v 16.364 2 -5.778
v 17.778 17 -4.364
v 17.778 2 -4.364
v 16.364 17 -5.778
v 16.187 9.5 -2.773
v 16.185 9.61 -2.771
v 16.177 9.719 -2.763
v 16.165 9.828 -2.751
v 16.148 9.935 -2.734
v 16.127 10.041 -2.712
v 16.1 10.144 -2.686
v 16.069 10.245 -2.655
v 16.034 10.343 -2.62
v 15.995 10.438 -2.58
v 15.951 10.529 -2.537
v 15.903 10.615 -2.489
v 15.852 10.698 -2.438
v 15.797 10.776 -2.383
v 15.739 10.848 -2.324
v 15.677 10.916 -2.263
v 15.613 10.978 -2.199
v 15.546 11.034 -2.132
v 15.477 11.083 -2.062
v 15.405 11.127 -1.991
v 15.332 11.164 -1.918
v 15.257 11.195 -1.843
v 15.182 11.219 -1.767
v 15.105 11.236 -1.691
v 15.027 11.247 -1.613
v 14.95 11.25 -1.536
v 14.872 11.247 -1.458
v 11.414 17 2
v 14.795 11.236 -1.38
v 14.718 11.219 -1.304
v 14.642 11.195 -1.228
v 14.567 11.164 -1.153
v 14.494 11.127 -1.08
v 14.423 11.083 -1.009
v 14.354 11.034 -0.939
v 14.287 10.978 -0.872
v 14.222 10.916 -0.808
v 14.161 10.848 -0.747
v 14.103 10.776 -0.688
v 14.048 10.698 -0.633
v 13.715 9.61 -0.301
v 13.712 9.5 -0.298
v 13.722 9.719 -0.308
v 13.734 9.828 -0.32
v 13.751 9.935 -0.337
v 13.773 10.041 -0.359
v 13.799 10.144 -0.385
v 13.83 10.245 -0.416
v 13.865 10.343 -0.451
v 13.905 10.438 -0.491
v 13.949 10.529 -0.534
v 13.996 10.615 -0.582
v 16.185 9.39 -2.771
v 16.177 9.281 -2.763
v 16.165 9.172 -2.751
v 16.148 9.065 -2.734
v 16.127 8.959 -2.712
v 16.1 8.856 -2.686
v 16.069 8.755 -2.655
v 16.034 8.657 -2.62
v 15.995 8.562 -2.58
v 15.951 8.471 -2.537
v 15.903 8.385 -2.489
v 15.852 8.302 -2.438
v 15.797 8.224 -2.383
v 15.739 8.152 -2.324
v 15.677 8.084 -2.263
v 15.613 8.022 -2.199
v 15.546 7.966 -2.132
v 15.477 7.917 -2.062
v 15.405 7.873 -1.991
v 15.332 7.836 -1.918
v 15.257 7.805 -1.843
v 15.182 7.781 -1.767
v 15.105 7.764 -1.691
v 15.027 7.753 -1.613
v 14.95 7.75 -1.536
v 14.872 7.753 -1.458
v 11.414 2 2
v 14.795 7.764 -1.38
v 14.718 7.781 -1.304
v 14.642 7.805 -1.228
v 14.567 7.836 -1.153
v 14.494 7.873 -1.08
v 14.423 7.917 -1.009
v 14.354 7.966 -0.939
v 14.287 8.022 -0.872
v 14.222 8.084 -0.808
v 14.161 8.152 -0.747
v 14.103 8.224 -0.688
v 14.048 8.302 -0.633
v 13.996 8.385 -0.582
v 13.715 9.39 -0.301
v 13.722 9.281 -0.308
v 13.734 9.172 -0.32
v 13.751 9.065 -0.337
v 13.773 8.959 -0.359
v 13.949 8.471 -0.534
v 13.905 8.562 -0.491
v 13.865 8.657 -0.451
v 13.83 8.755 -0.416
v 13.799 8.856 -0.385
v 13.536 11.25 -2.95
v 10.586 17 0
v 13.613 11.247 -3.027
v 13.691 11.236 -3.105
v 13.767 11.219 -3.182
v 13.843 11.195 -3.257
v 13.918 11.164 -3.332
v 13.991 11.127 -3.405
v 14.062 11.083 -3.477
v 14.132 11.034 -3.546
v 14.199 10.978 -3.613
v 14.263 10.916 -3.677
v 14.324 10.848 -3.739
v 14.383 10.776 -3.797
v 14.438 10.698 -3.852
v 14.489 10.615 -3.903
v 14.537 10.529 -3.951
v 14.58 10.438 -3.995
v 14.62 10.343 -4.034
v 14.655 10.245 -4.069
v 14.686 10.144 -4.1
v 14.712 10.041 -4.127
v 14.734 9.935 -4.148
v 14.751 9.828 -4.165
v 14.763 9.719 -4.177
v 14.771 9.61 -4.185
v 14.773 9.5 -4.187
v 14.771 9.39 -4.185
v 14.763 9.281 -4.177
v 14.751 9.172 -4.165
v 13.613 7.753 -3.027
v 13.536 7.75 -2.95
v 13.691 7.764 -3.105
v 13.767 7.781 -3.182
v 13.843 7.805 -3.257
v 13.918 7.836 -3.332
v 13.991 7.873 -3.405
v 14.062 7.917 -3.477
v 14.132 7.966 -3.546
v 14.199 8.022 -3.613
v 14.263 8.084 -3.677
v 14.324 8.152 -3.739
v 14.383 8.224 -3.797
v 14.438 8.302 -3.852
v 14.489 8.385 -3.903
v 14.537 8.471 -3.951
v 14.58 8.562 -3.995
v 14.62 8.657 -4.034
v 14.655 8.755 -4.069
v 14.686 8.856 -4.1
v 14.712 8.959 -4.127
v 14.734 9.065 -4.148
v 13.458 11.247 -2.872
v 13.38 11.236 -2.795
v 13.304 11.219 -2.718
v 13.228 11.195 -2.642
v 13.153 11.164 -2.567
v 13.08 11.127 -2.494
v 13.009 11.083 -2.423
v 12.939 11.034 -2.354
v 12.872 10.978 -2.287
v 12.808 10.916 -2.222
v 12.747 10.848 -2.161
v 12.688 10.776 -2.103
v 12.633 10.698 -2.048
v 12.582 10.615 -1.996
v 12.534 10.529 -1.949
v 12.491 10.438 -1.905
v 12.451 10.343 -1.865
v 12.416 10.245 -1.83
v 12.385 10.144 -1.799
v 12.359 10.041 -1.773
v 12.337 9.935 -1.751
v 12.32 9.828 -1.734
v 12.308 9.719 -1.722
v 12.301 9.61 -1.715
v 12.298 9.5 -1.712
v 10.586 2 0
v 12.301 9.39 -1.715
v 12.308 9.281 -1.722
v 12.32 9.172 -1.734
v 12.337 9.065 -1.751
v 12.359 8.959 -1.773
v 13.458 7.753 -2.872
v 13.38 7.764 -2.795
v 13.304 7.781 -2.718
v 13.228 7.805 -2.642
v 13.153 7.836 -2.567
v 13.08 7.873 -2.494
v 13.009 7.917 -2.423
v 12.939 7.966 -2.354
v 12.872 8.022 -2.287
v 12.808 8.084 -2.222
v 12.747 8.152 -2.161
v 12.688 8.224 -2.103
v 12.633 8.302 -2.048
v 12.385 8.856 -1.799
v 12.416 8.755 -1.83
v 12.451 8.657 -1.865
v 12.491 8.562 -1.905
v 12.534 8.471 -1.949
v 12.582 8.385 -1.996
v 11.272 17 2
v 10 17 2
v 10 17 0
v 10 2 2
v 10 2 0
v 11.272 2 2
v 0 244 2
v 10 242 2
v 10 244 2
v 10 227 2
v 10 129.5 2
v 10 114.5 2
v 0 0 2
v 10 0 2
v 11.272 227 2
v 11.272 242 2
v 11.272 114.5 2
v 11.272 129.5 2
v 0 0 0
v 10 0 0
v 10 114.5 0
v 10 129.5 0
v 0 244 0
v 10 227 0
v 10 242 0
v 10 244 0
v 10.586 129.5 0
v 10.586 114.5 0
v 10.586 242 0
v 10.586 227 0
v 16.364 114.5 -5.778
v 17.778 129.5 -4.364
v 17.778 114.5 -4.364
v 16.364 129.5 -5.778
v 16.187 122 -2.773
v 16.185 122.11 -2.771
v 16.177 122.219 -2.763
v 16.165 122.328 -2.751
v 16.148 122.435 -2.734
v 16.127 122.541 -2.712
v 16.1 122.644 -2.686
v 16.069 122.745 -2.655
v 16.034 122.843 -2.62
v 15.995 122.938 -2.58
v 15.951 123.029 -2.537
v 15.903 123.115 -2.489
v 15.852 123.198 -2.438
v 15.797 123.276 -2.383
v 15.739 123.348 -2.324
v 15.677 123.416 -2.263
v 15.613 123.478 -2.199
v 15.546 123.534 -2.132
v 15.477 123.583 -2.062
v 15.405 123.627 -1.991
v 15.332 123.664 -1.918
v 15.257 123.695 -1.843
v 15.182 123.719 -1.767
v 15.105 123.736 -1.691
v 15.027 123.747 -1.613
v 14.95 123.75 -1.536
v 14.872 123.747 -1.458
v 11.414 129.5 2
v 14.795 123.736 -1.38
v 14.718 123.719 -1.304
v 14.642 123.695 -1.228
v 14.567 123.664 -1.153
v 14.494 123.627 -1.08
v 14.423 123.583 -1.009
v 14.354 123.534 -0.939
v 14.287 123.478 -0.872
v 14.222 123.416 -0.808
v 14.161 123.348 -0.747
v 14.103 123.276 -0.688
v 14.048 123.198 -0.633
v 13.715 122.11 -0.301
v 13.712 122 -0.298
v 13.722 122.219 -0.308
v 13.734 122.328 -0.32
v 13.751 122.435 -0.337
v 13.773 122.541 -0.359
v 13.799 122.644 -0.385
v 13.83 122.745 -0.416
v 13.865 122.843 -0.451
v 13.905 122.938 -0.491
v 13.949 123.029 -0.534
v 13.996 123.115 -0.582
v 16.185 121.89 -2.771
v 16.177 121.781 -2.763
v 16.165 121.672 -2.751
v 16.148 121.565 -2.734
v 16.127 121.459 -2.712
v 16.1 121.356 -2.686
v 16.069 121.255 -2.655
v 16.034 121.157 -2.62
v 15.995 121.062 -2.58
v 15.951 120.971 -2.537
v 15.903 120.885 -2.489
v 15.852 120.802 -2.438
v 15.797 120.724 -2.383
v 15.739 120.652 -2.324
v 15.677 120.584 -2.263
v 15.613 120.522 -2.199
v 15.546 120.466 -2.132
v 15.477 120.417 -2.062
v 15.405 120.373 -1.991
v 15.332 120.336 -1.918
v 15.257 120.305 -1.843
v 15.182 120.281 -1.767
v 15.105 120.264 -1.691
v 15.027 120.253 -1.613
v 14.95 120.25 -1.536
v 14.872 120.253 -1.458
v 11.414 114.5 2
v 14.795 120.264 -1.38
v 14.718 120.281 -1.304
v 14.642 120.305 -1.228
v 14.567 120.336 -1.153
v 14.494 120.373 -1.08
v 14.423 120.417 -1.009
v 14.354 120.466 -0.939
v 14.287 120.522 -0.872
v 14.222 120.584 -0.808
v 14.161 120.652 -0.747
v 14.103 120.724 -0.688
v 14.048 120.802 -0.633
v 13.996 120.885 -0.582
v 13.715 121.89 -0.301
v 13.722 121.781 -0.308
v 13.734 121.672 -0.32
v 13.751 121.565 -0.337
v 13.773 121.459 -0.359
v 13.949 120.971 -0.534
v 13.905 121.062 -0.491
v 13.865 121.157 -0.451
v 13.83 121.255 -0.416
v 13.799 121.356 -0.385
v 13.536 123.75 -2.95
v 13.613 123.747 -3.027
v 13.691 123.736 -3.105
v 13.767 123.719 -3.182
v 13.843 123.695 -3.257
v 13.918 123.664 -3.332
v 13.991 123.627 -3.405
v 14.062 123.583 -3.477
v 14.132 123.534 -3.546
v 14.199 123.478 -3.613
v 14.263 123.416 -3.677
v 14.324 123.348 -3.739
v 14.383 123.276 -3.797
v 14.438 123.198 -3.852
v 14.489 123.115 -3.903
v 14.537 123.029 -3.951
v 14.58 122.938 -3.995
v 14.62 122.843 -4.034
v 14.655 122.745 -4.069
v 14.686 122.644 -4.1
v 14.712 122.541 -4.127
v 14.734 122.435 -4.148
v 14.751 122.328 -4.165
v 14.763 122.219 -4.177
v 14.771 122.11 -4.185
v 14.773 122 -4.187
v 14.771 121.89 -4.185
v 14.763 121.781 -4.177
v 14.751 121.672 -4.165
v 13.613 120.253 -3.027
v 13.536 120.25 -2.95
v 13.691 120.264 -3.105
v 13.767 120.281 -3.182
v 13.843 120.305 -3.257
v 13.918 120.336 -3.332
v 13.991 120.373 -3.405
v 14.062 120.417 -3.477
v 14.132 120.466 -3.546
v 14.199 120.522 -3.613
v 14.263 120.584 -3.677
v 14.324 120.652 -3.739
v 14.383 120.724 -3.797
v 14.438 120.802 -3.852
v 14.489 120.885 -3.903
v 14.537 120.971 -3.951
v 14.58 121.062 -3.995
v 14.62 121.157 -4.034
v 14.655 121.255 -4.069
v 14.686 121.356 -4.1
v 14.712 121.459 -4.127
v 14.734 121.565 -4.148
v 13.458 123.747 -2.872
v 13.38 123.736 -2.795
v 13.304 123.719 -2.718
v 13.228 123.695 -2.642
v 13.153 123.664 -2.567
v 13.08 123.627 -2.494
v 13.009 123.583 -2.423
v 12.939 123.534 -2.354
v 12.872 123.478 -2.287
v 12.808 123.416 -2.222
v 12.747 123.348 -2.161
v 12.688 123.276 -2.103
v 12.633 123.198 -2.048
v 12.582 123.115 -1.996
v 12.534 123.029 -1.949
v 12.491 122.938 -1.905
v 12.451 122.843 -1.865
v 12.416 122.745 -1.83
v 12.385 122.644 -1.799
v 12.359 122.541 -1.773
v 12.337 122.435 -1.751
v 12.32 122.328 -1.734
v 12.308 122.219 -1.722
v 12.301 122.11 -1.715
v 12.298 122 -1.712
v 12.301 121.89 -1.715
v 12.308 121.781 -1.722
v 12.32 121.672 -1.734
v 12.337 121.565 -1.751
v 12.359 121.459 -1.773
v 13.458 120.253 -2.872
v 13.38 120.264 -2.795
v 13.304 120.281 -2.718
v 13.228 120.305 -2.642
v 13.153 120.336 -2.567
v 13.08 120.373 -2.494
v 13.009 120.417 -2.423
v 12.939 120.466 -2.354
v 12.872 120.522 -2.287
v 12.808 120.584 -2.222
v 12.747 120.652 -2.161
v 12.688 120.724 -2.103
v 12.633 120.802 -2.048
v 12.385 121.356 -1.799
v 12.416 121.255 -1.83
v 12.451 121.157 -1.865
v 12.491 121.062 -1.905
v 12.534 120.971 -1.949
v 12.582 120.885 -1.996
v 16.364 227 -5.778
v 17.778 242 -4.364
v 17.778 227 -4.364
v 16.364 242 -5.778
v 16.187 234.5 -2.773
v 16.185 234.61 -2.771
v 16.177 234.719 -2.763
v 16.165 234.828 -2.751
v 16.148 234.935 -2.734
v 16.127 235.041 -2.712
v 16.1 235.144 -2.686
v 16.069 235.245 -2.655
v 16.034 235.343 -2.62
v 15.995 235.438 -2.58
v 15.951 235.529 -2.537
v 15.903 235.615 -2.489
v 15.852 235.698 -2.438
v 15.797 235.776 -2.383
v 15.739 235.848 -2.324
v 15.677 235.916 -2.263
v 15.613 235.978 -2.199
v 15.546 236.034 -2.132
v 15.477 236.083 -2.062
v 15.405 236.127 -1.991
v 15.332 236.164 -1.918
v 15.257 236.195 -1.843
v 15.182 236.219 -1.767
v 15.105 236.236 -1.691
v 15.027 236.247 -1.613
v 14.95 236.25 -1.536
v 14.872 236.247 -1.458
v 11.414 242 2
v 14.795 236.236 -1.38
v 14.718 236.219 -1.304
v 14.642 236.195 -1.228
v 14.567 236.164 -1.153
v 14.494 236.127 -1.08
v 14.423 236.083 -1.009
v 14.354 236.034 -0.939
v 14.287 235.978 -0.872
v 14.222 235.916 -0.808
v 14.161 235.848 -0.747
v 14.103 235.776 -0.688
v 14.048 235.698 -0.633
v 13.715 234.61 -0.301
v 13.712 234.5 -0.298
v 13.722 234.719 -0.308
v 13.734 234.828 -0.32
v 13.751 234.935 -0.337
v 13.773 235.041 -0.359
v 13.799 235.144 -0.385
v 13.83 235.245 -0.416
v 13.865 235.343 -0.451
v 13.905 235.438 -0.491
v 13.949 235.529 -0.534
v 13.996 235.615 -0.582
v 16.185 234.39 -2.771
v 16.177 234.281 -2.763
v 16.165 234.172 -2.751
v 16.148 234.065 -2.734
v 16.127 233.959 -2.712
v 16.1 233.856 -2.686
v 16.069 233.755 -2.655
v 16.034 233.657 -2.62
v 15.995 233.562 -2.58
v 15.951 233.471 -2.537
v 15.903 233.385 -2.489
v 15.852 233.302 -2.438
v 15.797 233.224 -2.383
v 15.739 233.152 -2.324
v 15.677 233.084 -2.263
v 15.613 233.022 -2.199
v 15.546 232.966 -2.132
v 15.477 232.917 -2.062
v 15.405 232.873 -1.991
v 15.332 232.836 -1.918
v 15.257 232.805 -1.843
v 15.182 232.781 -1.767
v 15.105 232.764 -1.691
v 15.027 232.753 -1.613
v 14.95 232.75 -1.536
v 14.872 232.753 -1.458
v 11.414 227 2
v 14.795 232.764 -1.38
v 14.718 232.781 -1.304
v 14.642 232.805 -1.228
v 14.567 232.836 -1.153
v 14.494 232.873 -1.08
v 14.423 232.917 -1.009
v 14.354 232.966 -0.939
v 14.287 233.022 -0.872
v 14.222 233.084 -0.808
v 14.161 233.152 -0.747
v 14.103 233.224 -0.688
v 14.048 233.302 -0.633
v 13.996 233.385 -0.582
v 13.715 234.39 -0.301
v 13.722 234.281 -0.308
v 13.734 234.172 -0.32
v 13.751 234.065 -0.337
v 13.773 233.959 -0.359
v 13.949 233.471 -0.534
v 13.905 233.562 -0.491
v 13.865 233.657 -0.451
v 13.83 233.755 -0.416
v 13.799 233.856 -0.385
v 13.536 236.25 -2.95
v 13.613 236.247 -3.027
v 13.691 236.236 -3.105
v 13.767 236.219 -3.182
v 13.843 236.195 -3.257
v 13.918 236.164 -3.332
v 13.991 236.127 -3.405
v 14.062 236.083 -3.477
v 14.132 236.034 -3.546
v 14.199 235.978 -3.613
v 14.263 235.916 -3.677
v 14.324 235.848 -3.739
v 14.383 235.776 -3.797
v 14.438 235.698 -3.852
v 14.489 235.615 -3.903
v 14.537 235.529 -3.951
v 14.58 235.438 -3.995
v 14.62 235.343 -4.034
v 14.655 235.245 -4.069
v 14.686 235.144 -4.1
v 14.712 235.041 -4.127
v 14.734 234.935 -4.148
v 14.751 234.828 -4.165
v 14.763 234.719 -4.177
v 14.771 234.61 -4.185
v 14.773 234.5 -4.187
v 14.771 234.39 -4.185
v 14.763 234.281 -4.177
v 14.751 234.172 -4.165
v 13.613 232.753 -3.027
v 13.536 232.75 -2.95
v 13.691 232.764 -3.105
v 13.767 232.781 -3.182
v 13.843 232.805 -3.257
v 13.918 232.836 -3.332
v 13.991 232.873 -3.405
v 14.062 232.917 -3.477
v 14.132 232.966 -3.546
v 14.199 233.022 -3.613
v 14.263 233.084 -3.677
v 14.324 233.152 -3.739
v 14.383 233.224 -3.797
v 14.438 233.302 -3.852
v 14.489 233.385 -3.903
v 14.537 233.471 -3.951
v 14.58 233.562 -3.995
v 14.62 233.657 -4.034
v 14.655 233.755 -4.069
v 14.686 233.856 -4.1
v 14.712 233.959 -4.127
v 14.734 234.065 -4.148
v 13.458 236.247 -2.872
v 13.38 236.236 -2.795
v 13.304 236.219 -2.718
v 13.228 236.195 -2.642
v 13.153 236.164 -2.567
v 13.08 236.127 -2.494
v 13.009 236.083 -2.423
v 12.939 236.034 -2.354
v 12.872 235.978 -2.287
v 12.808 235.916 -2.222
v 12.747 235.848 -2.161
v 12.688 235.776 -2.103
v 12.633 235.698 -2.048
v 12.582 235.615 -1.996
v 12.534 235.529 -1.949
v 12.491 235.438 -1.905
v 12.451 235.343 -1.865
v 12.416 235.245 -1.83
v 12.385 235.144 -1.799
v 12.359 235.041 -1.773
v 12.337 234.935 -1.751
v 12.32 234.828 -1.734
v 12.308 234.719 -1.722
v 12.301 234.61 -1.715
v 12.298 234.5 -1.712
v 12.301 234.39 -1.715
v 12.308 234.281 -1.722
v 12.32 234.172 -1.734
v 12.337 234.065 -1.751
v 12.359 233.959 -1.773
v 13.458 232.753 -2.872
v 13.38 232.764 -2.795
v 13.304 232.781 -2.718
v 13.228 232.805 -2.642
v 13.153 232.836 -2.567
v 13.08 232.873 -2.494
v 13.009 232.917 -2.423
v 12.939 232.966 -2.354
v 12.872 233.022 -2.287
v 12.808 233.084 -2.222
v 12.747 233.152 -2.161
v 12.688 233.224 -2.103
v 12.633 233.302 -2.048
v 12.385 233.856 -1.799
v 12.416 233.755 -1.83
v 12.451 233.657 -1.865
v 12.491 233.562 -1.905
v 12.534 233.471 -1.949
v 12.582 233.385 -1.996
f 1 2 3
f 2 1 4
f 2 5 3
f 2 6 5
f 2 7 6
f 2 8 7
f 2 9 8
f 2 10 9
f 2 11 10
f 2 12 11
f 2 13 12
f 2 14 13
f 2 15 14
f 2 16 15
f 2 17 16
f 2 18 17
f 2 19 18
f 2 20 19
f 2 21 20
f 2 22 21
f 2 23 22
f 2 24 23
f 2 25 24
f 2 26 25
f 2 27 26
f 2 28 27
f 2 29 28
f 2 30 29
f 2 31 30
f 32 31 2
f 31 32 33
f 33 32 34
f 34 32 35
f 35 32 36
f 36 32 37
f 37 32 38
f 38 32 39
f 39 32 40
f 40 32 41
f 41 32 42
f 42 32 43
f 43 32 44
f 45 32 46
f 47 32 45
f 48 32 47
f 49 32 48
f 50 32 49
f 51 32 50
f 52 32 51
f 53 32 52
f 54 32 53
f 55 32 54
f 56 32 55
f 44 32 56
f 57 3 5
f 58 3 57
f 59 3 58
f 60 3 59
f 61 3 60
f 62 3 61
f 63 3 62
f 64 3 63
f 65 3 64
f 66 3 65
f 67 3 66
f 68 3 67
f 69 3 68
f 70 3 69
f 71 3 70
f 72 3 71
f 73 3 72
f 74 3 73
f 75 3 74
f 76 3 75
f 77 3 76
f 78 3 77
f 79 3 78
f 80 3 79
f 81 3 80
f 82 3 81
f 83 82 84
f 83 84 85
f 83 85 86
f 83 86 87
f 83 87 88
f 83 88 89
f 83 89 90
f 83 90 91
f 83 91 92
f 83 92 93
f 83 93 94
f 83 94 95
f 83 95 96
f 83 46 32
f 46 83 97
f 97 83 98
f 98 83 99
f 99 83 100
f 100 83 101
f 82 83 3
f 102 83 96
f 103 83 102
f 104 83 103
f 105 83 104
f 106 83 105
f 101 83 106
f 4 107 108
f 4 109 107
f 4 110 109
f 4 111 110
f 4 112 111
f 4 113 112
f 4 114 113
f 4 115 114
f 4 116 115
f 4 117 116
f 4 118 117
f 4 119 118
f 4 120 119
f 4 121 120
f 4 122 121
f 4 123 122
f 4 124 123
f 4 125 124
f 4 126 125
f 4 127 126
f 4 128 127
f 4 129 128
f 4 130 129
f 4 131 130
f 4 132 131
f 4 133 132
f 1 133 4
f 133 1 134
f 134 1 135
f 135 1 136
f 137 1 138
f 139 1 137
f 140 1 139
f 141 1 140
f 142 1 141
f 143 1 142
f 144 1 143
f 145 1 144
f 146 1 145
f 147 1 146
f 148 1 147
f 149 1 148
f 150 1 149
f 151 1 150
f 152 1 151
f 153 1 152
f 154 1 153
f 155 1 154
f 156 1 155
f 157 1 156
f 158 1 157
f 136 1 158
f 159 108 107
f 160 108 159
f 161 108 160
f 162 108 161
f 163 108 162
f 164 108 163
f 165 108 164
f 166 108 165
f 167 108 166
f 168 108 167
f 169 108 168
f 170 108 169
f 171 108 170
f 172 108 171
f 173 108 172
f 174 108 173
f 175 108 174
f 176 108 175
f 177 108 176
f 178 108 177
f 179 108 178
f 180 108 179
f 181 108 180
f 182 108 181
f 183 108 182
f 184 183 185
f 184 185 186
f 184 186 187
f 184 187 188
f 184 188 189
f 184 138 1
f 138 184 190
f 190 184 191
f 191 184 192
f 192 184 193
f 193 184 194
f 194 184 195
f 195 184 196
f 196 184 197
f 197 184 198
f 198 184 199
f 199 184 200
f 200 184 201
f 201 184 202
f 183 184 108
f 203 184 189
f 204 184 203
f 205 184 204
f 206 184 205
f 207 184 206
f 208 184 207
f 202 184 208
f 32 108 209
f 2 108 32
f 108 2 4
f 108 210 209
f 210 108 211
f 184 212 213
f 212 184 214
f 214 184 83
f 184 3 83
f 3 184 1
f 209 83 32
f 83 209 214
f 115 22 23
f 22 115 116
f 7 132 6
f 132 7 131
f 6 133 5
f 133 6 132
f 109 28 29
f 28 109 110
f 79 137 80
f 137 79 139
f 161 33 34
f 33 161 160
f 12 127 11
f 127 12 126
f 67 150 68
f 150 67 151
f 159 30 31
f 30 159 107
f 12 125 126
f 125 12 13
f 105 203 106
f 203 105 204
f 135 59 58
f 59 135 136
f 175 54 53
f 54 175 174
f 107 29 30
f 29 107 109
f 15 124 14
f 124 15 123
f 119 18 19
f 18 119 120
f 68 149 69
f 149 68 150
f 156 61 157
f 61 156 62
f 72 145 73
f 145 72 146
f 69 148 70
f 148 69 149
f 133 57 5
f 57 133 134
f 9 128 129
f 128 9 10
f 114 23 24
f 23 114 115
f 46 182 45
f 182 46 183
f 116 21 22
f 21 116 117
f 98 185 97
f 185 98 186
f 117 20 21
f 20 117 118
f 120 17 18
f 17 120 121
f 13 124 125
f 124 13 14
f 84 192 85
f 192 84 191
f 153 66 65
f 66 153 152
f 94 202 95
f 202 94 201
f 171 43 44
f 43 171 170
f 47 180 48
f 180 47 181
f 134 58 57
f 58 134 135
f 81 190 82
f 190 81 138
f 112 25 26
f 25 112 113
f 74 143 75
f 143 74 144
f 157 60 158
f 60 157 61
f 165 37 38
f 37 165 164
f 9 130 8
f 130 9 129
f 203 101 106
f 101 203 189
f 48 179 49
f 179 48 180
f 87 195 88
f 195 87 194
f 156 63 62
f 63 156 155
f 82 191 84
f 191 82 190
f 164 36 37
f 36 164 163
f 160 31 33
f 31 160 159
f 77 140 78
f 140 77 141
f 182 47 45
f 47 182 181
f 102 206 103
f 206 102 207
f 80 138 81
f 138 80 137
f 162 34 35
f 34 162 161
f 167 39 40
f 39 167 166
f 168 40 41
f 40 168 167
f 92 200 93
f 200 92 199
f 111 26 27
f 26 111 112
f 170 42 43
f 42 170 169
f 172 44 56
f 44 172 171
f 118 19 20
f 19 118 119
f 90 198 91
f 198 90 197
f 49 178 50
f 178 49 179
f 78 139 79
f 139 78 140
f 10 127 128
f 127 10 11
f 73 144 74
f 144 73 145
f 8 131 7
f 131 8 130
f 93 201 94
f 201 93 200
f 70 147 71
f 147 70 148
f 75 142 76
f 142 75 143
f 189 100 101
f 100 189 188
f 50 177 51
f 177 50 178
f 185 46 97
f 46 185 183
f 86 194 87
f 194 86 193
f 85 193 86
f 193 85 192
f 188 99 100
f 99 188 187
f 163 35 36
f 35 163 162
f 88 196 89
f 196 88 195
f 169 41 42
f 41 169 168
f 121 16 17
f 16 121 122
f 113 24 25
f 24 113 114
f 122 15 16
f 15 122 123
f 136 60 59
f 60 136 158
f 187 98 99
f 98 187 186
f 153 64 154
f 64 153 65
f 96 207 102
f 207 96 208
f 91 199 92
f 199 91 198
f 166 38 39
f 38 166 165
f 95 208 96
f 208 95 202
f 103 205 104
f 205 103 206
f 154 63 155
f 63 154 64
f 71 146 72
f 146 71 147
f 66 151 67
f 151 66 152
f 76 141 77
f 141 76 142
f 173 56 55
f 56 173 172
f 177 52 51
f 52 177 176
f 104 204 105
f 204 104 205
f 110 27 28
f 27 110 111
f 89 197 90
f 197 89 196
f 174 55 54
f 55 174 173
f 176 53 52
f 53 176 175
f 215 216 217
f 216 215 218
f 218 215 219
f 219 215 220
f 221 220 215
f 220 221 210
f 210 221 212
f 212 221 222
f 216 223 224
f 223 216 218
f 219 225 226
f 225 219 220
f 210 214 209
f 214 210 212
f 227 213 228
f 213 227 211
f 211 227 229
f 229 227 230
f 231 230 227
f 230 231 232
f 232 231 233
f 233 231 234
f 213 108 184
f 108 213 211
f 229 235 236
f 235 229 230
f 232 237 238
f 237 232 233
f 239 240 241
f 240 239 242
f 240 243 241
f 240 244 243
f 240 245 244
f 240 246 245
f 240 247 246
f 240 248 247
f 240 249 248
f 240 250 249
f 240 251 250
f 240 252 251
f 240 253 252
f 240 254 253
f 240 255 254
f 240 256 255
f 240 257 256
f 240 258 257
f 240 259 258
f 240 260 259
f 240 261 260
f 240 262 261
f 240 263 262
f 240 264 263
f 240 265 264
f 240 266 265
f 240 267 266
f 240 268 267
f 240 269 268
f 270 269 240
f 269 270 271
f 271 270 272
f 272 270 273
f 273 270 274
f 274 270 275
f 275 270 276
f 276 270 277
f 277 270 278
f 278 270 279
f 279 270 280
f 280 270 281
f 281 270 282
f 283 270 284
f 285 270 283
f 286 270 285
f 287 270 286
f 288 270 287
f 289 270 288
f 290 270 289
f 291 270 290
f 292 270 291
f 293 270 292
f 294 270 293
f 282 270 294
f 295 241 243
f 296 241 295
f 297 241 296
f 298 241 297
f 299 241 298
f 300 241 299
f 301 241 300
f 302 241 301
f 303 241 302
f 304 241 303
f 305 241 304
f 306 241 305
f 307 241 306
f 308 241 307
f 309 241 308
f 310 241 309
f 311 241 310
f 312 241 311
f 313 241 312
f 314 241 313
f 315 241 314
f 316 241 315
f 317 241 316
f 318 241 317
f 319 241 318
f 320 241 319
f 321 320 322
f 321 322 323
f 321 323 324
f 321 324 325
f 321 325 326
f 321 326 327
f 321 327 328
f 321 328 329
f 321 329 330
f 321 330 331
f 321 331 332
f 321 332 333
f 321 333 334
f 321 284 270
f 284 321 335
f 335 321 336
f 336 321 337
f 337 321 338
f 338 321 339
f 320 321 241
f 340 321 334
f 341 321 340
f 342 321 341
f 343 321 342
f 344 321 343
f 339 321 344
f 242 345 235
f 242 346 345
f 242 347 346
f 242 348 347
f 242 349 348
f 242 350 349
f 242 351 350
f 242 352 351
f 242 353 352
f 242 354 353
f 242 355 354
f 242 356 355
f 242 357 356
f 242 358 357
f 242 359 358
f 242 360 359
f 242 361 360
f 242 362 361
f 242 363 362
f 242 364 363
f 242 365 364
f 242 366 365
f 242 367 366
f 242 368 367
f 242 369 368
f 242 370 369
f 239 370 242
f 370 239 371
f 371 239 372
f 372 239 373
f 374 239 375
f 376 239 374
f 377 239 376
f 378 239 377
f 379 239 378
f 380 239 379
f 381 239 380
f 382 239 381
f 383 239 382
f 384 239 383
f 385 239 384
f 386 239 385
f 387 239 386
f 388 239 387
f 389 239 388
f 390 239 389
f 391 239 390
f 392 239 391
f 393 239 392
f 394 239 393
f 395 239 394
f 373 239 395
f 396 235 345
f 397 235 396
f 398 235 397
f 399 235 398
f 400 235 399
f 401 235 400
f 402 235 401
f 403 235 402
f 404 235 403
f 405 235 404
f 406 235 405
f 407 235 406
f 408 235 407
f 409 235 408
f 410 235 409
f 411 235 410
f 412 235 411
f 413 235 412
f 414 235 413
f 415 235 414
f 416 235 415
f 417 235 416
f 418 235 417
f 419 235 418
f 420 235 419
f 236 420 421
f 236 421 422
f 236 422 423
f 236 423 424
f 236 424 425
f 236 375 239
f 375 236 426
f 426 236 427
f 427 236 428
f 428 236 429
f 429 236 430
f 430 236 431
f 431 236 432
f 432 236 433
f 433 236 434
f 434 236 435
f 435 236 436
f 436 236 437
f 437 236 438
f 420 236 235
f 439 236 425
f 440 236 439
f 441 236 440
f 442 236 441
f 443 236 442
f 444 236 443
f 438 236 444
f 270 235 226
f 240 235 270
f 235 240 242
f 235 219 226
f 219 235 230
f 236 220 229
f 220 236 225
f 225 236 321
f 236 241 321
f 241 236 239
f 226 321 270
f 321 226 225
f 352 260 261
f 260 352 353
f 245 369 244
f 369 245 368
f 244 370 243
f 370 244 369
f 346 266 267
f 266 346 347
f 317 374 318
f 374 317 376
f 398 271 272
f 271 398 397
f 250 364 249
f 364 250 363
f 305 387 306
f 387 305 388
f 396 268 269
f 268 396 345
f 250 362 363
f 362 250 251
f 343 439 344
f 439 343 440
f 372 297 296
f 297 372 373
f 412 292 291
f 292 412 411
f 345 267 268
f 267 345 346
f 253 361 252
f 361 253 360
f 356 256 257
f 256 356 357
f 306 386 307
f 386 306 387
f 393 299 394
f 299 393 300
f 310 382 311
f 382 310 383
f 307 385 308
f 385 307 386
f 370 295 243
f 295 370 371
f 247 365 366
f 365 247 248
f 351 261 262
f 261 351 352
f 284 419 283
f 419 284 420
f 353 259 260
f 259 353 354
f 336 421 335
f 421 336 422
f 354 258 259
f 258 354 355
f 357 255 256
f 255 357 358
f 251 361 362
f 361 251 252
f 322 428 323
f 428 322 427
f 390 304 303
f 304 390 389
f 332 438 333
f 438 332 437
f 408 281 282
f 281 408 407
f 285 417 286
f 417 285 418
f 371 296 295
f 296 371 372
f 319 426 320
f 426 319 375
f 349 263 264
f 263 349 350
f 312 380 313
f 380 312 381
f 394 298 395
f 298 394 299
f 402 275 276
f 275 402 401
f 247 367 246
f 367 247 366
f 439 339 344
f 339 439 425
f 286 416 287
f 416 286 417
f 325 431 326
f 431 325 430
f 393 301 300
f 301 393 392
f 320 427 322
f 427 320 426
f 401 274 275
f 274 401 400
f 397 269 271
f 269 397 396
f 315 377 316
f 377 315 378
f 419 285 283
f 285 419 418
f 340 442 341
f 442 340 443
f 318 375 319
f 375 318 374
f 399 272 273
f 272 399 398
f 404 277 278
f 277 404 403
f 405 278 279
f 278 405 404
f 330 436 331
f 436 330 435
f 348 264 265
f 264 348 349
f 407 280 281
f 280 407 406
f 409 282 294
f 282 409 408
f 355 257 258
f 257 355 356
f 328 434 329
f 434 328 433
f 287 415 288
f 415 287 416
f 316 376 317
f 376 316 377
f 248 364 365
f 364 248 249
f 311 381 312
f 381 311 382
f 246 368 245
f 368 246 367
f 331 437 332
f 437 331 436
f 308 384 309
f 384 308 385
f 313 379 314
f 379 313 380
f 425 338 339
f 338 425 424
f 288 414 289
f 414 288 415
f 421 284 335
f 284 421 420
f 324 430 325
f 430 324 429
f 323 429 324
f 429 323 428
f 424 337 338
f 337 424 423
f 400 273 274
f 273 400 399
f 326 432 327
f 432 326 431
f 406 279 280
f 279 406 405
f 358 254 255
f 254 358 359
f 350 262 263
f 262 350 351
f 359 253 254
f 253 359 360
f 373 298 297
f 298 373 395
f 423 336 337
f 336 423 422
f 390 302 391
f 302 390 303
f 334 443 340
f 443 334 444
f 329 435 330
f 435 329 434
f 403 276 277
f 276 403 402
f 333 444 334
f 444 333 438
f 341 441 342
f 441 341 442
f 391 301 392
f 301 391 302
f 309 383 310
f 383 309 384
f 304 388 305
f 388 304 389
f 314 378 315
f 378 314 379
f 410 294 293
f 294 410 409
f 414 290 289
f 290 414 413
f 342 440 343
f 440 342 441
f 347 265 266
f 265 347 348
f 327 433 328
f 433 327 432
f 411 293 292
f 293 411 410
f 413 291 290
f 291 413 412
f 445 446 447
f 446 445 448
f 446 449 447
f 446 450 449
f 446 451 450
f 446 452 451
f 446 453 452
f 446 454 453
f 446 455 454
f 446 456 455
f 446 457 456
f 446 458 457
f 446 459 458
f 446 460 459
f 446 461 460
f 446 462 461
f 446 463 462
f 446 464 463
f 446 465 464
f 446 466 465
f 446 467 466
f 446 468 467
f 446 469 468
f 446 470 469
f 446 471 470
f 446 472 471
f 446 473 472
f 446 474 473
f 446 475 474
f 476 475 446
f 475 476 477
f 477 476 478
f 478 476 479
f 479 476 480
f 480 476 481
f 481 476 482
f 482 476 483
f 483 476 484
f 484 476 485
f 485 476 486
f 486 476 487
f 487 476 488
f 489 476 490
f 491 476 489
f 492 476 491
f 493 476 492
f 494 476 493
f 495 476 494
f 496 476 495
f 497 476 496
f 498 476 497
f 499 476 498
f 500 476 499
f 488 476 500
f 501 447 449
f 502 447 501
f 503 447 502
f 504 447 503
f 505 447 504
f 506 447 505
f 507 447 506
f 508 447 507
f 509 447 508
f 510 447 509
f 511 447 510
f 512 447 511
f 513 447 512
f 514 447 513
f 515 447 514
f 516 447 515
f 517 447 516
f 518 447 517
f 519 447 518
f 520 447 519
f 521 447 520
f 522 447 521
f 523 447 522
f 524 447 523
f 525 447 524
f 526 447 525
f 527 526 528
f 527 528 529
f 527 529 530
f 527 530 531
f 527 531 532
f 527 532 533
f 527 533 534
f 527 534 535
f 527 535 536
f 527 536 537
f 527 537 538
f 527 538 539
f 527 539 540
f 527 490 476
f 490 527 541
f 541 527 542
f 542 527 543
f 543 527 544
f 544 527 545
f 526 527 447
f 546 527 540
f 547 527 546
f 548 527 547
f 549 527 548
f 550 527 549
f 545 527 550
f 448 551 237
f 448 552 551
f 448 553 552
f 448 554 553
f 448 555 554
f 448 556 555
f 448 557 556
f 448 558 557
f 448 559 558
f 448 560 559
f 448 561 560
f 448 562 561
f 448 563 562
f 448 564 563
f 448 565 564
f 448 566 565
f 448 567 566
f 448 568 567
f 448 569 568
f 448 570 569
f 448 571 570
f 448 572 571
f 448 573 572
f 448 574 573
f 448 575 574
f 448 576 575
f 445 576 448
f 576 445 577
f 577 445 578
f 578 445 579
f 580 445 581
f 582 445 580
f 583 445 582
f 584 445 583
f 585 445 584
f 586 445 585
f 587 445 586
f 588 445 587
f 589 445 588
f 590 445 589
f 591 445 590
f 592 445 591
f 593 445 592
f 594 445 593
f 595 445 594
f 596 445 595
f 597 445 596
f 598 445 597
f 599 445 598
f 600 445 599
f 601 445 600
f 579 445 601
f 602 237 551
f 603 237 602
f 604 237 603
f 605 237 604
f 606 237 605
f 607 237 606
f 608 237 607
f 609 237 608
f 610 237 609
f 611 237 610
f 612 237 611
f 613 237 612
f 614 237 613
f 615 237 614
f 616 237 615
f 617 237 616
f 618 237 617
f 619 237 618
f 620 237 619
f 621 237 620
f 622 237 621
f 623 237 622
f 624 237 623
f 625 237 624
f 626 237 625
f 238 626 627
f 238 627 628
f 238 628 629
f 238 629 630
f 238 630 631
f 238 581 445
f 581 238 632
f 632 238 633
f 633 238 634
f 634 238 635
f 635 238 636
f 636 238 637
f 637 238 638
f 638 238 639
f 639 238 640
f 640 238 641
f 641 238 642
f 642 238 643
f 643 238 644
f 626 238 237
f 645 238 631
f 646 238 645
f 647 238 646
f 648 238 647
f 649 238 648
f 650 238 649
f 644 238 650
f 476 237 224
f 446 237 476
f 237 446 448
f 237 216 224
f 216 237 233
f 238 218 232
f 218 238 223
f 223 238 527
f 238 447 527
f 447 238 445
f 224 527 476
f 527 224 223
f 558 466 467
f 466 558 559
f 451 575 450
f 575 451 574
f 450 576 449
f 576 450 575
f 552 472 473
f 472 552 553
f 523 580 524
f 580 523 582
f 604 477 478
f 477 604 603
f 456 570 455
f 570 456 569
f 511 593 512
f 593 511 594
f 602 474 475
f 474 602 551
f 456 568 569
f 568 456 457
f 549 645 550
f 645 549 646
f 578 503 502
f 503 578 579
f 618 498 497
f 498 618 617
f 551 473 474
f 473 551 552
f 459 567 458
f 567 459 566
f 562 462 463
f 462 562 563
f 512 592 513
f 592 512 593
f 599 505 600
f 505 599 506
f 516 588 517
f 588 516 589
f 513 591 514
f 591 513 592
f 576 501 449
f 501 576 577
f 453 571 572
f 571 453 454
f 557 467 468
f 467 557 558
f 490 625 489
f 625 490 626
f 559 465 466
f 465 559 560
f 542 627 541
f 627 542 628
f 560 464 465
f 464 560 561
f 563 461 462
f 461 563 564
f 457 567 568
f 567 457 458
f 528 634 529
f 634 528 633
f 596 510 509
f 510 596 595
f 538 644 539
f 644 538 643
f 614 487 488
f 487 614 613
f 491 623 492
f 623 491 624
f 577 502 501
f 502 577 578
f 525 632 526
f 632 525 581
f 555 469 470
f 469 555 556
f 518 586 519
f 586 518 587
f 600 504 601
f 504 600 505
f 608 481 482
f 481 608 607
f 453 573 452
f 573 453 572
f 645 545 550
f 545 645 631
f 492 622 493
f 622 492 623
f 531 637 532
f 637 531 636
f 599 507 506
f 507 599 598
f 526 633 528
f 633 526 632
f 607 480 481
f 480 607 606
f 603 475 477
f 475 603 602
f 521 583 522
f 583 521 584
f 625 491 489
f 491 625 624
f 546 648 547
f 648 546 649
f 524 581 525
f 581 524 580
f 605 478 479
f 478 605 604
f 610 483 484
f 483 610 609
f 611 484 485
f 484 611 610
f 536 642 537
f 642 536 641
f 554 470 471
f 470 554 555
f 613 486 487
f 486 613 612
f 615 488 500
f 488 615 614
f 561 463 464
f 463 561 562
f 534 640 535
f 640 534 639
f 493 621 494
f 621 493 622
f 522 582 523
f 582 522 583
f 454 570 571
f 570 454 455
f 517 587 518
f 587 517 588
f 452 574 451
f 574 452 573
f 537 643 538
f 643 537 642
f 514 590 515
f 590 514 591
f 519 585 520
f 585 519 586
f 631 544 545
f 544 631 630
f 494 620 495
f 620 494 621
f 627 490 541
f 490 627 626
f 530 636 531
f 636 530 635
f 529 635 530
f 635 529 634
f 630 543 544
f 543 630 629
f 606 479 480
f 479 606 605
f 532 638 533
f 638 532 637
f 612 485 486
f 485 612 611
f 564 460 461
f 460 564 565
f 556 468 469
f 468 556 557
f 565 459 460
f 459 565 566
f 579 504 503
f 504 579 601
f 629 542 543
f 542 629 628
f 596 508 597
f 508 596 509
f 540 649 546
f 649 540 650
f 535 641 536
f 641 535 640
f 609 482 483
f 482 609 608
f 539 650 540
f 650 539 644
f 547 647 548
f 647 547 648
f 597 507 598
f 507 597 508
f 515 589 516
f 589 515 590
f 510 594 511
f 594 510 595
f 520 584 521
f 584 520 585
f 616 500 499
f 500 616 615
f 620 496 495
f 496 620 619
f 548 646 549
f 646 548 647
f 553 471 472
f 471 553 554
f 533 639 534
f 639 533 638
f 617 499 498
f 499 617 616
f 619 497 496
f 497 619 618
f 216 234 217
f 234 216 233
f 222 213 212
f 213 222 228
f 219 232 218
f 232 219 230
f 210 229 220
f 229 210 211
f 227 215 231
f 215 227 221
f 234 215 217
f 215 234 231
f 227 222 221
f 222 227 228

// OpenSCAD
//
// LED Strip Mount for FlashForge Creator Pro to attach
//    to the cable tie screws on the vertical supports
//

$fn = 100;

//
// Parameters:
//

LEDMountWidth = 10;		// LED Strip width
LEDMountLength = 244;		// LED Strip Length
LEDMountThickness = 2;		// LED Mounting plate thickness

MountAngle = 45;				// Degrees from mount point to strip

MountTongueWidth = 9;		// Mounting Tongue Plate Width
MountTongueLength = 15;	// Mounting Tongue Plate Length
MountTongueThickness = 2;	// Mounting Tongue Plate Thickness
MountHoleDia = 3.5;			// Diameter of the Mounting Holes
MountHoleExtraOffset = 0.5;	// Extra offset distance from main piece to mounting hole

FFCPMntCenters = 112.5;		// Distance from mount screw to mount screw in FFCP
NumTongues = floor(LEDMountLength/FFCPMntCenters);		// Zero-originated
EndArea = (LEDMountLength - (NumTongues*FFCPMntCenters))/2;


//
// Rendering:
//
RenderType = 0;				// 0=Render All, 1=Render Left, 2=Render Right
RenderSplit = (LEDMountLength*3)/5;		// Point to split left/right halves (avoid mount tongue!)
RenderCutCount = 5;						// Number of cut point lines
RenderCutMag = [ -2, 2, -2, 2, -2, 2 ];		// Offset and direction of each cut point line

Render();

// ------------------------------------------------------------------

module Render() {
	CutStepSize = LEDMountWidth/RenderCutCount;

	if (RenderType == 0) {
		LEDStripMount();
	} else if (RenderType == 1) {
		intersection() {
			union() {
				// Make "splice teeth":
				for (n = [0:RenderCutCount-1]) {
					translate([0, 0, -MountTongueWidth - 0.1])
					linear_extrude(height = LEDMountThickness + MountTongueWidth + 0.2)
					polygon(points =
									[	[n*CutStepSize, RenderSplit + RenderCutMag[n] ],
										[(n+1)*CutStepSize, RenderSplit + RenderCutMag[n+1] ],
										[(n+1)*CutStepSize, 0 ],
										[n*CutStepSize, 0]
									]
					);
				}
				// Keep remaining parts outside of main mount:
				translate([LEDMountWidth-0.1, -RenderCutMag[RenderCutCount], -MountTongueWidth-0.1])
				cube([LEDMountWidth + MountTongueWidth+0.2, RenderSplit, LEDMountThickness + MountTongueWidth + 0.2]);
			}
			
			LEDStripMount();
		}
	} else if (RenderType == 2) {
		intersection() {
			union() {
				// Make "splice teeth":
				for (n = [0:RenderCutCount-1]) {
					translate([0, 0, -MountTongueWidth - 0.1])
					linear_extrude(height = LEDMountThickness + MountTongueWidth + 0.2)
					polygon(points =
									[	[n*CutStepSize, RenderSplit + RenderCutMag[n] ],
										[(n+1)*CutStepSize, RenderSplit + RenderCutMag[n+1] ],
										[(n+1)*CutStepSize, LEDMountLength ],
										[n*CutStepSize, LEDMountLength]
									]
					);
				}
				// Keep remaining parts outside of main mount:
				translate([LEDMountWidth-0.1, RenderSplit+RenderCutMag[RenderCutCount], -MountTongueWidth-0.1])
				cube([LEDMountWidth + MountTongueWidth+0.2, LEDMountLength, LEDMountThickness + MountTongueWidth + 0.2]);
			}
			
			LEDStripMount();
		}
	}
}

module LEDStripMount()
{
	LEDStrip();

	for (n = [0:NumTongues])
	{
		translate([LEDMountWidth, EndArea + n*FFCPMntCenters, 0])
		MountTongue();
	}
}

module MountTongue()
{
	union() {
		translate([0,0, MountTongueThickness - MountTongueThickness*cos(MountAngle) ])
		rotate([0, MountAngle, 0])
		difference() {
			// Tongue:
			translate([0, -MountTongueLength/2, 0])		// Center with mounting hole
			union() {
				// Main Tongue:
				cube([MountTongueWidth, MountTongueLength, MountTongueThickness]);

				// End perpendicular:
				translate([0,0, MountTongueThickness])
				rotate([-MountAngle,0,90])
				prism(MountTongueLength, MountTongueThickness*sin(MountAngle), -MountTongueThickness);
			}

			// Mounting hole:
			translate([MountTongueWidth/2+MountHoleExtraOffset,0,-0.1])
			cylinder(d=MountHoleDia, h=MountTongueThickness+0.2);
		}

		// Transition
		if (MountAngle <= 45) {
			translate([-0.1, -MountTongueLength/2, 0])
			cube([2*((MountTongueThickness - MountTongueThickness*cos(MountAngle))+0.1), MountTongueLength, LEDMountThickness]);
		} else {
			translate([-0.1, -MountTongueLength/2, 0])
			cube([2*((MountTongueThickness - MountTongueThickness*sin(MountAngle))+0.1), MountTongueLength, LEDMountThickness]);
		}
	}
}

module prism(l, w, h){
	polyhedron(
		points=[[0,0,0], [l,0,0], [l,w,0], [0,w,0], [0,w,h], [l,w,h]],
		faces=[[0,1,2,3],[5,4,3,2],[0,4,5,1],[0,3,4],[5,2,1]]
	);
}

module LEDStrip()
{
	cube([LEDMountWidth, LEDMountLength, LEDMountThickness]);
}
